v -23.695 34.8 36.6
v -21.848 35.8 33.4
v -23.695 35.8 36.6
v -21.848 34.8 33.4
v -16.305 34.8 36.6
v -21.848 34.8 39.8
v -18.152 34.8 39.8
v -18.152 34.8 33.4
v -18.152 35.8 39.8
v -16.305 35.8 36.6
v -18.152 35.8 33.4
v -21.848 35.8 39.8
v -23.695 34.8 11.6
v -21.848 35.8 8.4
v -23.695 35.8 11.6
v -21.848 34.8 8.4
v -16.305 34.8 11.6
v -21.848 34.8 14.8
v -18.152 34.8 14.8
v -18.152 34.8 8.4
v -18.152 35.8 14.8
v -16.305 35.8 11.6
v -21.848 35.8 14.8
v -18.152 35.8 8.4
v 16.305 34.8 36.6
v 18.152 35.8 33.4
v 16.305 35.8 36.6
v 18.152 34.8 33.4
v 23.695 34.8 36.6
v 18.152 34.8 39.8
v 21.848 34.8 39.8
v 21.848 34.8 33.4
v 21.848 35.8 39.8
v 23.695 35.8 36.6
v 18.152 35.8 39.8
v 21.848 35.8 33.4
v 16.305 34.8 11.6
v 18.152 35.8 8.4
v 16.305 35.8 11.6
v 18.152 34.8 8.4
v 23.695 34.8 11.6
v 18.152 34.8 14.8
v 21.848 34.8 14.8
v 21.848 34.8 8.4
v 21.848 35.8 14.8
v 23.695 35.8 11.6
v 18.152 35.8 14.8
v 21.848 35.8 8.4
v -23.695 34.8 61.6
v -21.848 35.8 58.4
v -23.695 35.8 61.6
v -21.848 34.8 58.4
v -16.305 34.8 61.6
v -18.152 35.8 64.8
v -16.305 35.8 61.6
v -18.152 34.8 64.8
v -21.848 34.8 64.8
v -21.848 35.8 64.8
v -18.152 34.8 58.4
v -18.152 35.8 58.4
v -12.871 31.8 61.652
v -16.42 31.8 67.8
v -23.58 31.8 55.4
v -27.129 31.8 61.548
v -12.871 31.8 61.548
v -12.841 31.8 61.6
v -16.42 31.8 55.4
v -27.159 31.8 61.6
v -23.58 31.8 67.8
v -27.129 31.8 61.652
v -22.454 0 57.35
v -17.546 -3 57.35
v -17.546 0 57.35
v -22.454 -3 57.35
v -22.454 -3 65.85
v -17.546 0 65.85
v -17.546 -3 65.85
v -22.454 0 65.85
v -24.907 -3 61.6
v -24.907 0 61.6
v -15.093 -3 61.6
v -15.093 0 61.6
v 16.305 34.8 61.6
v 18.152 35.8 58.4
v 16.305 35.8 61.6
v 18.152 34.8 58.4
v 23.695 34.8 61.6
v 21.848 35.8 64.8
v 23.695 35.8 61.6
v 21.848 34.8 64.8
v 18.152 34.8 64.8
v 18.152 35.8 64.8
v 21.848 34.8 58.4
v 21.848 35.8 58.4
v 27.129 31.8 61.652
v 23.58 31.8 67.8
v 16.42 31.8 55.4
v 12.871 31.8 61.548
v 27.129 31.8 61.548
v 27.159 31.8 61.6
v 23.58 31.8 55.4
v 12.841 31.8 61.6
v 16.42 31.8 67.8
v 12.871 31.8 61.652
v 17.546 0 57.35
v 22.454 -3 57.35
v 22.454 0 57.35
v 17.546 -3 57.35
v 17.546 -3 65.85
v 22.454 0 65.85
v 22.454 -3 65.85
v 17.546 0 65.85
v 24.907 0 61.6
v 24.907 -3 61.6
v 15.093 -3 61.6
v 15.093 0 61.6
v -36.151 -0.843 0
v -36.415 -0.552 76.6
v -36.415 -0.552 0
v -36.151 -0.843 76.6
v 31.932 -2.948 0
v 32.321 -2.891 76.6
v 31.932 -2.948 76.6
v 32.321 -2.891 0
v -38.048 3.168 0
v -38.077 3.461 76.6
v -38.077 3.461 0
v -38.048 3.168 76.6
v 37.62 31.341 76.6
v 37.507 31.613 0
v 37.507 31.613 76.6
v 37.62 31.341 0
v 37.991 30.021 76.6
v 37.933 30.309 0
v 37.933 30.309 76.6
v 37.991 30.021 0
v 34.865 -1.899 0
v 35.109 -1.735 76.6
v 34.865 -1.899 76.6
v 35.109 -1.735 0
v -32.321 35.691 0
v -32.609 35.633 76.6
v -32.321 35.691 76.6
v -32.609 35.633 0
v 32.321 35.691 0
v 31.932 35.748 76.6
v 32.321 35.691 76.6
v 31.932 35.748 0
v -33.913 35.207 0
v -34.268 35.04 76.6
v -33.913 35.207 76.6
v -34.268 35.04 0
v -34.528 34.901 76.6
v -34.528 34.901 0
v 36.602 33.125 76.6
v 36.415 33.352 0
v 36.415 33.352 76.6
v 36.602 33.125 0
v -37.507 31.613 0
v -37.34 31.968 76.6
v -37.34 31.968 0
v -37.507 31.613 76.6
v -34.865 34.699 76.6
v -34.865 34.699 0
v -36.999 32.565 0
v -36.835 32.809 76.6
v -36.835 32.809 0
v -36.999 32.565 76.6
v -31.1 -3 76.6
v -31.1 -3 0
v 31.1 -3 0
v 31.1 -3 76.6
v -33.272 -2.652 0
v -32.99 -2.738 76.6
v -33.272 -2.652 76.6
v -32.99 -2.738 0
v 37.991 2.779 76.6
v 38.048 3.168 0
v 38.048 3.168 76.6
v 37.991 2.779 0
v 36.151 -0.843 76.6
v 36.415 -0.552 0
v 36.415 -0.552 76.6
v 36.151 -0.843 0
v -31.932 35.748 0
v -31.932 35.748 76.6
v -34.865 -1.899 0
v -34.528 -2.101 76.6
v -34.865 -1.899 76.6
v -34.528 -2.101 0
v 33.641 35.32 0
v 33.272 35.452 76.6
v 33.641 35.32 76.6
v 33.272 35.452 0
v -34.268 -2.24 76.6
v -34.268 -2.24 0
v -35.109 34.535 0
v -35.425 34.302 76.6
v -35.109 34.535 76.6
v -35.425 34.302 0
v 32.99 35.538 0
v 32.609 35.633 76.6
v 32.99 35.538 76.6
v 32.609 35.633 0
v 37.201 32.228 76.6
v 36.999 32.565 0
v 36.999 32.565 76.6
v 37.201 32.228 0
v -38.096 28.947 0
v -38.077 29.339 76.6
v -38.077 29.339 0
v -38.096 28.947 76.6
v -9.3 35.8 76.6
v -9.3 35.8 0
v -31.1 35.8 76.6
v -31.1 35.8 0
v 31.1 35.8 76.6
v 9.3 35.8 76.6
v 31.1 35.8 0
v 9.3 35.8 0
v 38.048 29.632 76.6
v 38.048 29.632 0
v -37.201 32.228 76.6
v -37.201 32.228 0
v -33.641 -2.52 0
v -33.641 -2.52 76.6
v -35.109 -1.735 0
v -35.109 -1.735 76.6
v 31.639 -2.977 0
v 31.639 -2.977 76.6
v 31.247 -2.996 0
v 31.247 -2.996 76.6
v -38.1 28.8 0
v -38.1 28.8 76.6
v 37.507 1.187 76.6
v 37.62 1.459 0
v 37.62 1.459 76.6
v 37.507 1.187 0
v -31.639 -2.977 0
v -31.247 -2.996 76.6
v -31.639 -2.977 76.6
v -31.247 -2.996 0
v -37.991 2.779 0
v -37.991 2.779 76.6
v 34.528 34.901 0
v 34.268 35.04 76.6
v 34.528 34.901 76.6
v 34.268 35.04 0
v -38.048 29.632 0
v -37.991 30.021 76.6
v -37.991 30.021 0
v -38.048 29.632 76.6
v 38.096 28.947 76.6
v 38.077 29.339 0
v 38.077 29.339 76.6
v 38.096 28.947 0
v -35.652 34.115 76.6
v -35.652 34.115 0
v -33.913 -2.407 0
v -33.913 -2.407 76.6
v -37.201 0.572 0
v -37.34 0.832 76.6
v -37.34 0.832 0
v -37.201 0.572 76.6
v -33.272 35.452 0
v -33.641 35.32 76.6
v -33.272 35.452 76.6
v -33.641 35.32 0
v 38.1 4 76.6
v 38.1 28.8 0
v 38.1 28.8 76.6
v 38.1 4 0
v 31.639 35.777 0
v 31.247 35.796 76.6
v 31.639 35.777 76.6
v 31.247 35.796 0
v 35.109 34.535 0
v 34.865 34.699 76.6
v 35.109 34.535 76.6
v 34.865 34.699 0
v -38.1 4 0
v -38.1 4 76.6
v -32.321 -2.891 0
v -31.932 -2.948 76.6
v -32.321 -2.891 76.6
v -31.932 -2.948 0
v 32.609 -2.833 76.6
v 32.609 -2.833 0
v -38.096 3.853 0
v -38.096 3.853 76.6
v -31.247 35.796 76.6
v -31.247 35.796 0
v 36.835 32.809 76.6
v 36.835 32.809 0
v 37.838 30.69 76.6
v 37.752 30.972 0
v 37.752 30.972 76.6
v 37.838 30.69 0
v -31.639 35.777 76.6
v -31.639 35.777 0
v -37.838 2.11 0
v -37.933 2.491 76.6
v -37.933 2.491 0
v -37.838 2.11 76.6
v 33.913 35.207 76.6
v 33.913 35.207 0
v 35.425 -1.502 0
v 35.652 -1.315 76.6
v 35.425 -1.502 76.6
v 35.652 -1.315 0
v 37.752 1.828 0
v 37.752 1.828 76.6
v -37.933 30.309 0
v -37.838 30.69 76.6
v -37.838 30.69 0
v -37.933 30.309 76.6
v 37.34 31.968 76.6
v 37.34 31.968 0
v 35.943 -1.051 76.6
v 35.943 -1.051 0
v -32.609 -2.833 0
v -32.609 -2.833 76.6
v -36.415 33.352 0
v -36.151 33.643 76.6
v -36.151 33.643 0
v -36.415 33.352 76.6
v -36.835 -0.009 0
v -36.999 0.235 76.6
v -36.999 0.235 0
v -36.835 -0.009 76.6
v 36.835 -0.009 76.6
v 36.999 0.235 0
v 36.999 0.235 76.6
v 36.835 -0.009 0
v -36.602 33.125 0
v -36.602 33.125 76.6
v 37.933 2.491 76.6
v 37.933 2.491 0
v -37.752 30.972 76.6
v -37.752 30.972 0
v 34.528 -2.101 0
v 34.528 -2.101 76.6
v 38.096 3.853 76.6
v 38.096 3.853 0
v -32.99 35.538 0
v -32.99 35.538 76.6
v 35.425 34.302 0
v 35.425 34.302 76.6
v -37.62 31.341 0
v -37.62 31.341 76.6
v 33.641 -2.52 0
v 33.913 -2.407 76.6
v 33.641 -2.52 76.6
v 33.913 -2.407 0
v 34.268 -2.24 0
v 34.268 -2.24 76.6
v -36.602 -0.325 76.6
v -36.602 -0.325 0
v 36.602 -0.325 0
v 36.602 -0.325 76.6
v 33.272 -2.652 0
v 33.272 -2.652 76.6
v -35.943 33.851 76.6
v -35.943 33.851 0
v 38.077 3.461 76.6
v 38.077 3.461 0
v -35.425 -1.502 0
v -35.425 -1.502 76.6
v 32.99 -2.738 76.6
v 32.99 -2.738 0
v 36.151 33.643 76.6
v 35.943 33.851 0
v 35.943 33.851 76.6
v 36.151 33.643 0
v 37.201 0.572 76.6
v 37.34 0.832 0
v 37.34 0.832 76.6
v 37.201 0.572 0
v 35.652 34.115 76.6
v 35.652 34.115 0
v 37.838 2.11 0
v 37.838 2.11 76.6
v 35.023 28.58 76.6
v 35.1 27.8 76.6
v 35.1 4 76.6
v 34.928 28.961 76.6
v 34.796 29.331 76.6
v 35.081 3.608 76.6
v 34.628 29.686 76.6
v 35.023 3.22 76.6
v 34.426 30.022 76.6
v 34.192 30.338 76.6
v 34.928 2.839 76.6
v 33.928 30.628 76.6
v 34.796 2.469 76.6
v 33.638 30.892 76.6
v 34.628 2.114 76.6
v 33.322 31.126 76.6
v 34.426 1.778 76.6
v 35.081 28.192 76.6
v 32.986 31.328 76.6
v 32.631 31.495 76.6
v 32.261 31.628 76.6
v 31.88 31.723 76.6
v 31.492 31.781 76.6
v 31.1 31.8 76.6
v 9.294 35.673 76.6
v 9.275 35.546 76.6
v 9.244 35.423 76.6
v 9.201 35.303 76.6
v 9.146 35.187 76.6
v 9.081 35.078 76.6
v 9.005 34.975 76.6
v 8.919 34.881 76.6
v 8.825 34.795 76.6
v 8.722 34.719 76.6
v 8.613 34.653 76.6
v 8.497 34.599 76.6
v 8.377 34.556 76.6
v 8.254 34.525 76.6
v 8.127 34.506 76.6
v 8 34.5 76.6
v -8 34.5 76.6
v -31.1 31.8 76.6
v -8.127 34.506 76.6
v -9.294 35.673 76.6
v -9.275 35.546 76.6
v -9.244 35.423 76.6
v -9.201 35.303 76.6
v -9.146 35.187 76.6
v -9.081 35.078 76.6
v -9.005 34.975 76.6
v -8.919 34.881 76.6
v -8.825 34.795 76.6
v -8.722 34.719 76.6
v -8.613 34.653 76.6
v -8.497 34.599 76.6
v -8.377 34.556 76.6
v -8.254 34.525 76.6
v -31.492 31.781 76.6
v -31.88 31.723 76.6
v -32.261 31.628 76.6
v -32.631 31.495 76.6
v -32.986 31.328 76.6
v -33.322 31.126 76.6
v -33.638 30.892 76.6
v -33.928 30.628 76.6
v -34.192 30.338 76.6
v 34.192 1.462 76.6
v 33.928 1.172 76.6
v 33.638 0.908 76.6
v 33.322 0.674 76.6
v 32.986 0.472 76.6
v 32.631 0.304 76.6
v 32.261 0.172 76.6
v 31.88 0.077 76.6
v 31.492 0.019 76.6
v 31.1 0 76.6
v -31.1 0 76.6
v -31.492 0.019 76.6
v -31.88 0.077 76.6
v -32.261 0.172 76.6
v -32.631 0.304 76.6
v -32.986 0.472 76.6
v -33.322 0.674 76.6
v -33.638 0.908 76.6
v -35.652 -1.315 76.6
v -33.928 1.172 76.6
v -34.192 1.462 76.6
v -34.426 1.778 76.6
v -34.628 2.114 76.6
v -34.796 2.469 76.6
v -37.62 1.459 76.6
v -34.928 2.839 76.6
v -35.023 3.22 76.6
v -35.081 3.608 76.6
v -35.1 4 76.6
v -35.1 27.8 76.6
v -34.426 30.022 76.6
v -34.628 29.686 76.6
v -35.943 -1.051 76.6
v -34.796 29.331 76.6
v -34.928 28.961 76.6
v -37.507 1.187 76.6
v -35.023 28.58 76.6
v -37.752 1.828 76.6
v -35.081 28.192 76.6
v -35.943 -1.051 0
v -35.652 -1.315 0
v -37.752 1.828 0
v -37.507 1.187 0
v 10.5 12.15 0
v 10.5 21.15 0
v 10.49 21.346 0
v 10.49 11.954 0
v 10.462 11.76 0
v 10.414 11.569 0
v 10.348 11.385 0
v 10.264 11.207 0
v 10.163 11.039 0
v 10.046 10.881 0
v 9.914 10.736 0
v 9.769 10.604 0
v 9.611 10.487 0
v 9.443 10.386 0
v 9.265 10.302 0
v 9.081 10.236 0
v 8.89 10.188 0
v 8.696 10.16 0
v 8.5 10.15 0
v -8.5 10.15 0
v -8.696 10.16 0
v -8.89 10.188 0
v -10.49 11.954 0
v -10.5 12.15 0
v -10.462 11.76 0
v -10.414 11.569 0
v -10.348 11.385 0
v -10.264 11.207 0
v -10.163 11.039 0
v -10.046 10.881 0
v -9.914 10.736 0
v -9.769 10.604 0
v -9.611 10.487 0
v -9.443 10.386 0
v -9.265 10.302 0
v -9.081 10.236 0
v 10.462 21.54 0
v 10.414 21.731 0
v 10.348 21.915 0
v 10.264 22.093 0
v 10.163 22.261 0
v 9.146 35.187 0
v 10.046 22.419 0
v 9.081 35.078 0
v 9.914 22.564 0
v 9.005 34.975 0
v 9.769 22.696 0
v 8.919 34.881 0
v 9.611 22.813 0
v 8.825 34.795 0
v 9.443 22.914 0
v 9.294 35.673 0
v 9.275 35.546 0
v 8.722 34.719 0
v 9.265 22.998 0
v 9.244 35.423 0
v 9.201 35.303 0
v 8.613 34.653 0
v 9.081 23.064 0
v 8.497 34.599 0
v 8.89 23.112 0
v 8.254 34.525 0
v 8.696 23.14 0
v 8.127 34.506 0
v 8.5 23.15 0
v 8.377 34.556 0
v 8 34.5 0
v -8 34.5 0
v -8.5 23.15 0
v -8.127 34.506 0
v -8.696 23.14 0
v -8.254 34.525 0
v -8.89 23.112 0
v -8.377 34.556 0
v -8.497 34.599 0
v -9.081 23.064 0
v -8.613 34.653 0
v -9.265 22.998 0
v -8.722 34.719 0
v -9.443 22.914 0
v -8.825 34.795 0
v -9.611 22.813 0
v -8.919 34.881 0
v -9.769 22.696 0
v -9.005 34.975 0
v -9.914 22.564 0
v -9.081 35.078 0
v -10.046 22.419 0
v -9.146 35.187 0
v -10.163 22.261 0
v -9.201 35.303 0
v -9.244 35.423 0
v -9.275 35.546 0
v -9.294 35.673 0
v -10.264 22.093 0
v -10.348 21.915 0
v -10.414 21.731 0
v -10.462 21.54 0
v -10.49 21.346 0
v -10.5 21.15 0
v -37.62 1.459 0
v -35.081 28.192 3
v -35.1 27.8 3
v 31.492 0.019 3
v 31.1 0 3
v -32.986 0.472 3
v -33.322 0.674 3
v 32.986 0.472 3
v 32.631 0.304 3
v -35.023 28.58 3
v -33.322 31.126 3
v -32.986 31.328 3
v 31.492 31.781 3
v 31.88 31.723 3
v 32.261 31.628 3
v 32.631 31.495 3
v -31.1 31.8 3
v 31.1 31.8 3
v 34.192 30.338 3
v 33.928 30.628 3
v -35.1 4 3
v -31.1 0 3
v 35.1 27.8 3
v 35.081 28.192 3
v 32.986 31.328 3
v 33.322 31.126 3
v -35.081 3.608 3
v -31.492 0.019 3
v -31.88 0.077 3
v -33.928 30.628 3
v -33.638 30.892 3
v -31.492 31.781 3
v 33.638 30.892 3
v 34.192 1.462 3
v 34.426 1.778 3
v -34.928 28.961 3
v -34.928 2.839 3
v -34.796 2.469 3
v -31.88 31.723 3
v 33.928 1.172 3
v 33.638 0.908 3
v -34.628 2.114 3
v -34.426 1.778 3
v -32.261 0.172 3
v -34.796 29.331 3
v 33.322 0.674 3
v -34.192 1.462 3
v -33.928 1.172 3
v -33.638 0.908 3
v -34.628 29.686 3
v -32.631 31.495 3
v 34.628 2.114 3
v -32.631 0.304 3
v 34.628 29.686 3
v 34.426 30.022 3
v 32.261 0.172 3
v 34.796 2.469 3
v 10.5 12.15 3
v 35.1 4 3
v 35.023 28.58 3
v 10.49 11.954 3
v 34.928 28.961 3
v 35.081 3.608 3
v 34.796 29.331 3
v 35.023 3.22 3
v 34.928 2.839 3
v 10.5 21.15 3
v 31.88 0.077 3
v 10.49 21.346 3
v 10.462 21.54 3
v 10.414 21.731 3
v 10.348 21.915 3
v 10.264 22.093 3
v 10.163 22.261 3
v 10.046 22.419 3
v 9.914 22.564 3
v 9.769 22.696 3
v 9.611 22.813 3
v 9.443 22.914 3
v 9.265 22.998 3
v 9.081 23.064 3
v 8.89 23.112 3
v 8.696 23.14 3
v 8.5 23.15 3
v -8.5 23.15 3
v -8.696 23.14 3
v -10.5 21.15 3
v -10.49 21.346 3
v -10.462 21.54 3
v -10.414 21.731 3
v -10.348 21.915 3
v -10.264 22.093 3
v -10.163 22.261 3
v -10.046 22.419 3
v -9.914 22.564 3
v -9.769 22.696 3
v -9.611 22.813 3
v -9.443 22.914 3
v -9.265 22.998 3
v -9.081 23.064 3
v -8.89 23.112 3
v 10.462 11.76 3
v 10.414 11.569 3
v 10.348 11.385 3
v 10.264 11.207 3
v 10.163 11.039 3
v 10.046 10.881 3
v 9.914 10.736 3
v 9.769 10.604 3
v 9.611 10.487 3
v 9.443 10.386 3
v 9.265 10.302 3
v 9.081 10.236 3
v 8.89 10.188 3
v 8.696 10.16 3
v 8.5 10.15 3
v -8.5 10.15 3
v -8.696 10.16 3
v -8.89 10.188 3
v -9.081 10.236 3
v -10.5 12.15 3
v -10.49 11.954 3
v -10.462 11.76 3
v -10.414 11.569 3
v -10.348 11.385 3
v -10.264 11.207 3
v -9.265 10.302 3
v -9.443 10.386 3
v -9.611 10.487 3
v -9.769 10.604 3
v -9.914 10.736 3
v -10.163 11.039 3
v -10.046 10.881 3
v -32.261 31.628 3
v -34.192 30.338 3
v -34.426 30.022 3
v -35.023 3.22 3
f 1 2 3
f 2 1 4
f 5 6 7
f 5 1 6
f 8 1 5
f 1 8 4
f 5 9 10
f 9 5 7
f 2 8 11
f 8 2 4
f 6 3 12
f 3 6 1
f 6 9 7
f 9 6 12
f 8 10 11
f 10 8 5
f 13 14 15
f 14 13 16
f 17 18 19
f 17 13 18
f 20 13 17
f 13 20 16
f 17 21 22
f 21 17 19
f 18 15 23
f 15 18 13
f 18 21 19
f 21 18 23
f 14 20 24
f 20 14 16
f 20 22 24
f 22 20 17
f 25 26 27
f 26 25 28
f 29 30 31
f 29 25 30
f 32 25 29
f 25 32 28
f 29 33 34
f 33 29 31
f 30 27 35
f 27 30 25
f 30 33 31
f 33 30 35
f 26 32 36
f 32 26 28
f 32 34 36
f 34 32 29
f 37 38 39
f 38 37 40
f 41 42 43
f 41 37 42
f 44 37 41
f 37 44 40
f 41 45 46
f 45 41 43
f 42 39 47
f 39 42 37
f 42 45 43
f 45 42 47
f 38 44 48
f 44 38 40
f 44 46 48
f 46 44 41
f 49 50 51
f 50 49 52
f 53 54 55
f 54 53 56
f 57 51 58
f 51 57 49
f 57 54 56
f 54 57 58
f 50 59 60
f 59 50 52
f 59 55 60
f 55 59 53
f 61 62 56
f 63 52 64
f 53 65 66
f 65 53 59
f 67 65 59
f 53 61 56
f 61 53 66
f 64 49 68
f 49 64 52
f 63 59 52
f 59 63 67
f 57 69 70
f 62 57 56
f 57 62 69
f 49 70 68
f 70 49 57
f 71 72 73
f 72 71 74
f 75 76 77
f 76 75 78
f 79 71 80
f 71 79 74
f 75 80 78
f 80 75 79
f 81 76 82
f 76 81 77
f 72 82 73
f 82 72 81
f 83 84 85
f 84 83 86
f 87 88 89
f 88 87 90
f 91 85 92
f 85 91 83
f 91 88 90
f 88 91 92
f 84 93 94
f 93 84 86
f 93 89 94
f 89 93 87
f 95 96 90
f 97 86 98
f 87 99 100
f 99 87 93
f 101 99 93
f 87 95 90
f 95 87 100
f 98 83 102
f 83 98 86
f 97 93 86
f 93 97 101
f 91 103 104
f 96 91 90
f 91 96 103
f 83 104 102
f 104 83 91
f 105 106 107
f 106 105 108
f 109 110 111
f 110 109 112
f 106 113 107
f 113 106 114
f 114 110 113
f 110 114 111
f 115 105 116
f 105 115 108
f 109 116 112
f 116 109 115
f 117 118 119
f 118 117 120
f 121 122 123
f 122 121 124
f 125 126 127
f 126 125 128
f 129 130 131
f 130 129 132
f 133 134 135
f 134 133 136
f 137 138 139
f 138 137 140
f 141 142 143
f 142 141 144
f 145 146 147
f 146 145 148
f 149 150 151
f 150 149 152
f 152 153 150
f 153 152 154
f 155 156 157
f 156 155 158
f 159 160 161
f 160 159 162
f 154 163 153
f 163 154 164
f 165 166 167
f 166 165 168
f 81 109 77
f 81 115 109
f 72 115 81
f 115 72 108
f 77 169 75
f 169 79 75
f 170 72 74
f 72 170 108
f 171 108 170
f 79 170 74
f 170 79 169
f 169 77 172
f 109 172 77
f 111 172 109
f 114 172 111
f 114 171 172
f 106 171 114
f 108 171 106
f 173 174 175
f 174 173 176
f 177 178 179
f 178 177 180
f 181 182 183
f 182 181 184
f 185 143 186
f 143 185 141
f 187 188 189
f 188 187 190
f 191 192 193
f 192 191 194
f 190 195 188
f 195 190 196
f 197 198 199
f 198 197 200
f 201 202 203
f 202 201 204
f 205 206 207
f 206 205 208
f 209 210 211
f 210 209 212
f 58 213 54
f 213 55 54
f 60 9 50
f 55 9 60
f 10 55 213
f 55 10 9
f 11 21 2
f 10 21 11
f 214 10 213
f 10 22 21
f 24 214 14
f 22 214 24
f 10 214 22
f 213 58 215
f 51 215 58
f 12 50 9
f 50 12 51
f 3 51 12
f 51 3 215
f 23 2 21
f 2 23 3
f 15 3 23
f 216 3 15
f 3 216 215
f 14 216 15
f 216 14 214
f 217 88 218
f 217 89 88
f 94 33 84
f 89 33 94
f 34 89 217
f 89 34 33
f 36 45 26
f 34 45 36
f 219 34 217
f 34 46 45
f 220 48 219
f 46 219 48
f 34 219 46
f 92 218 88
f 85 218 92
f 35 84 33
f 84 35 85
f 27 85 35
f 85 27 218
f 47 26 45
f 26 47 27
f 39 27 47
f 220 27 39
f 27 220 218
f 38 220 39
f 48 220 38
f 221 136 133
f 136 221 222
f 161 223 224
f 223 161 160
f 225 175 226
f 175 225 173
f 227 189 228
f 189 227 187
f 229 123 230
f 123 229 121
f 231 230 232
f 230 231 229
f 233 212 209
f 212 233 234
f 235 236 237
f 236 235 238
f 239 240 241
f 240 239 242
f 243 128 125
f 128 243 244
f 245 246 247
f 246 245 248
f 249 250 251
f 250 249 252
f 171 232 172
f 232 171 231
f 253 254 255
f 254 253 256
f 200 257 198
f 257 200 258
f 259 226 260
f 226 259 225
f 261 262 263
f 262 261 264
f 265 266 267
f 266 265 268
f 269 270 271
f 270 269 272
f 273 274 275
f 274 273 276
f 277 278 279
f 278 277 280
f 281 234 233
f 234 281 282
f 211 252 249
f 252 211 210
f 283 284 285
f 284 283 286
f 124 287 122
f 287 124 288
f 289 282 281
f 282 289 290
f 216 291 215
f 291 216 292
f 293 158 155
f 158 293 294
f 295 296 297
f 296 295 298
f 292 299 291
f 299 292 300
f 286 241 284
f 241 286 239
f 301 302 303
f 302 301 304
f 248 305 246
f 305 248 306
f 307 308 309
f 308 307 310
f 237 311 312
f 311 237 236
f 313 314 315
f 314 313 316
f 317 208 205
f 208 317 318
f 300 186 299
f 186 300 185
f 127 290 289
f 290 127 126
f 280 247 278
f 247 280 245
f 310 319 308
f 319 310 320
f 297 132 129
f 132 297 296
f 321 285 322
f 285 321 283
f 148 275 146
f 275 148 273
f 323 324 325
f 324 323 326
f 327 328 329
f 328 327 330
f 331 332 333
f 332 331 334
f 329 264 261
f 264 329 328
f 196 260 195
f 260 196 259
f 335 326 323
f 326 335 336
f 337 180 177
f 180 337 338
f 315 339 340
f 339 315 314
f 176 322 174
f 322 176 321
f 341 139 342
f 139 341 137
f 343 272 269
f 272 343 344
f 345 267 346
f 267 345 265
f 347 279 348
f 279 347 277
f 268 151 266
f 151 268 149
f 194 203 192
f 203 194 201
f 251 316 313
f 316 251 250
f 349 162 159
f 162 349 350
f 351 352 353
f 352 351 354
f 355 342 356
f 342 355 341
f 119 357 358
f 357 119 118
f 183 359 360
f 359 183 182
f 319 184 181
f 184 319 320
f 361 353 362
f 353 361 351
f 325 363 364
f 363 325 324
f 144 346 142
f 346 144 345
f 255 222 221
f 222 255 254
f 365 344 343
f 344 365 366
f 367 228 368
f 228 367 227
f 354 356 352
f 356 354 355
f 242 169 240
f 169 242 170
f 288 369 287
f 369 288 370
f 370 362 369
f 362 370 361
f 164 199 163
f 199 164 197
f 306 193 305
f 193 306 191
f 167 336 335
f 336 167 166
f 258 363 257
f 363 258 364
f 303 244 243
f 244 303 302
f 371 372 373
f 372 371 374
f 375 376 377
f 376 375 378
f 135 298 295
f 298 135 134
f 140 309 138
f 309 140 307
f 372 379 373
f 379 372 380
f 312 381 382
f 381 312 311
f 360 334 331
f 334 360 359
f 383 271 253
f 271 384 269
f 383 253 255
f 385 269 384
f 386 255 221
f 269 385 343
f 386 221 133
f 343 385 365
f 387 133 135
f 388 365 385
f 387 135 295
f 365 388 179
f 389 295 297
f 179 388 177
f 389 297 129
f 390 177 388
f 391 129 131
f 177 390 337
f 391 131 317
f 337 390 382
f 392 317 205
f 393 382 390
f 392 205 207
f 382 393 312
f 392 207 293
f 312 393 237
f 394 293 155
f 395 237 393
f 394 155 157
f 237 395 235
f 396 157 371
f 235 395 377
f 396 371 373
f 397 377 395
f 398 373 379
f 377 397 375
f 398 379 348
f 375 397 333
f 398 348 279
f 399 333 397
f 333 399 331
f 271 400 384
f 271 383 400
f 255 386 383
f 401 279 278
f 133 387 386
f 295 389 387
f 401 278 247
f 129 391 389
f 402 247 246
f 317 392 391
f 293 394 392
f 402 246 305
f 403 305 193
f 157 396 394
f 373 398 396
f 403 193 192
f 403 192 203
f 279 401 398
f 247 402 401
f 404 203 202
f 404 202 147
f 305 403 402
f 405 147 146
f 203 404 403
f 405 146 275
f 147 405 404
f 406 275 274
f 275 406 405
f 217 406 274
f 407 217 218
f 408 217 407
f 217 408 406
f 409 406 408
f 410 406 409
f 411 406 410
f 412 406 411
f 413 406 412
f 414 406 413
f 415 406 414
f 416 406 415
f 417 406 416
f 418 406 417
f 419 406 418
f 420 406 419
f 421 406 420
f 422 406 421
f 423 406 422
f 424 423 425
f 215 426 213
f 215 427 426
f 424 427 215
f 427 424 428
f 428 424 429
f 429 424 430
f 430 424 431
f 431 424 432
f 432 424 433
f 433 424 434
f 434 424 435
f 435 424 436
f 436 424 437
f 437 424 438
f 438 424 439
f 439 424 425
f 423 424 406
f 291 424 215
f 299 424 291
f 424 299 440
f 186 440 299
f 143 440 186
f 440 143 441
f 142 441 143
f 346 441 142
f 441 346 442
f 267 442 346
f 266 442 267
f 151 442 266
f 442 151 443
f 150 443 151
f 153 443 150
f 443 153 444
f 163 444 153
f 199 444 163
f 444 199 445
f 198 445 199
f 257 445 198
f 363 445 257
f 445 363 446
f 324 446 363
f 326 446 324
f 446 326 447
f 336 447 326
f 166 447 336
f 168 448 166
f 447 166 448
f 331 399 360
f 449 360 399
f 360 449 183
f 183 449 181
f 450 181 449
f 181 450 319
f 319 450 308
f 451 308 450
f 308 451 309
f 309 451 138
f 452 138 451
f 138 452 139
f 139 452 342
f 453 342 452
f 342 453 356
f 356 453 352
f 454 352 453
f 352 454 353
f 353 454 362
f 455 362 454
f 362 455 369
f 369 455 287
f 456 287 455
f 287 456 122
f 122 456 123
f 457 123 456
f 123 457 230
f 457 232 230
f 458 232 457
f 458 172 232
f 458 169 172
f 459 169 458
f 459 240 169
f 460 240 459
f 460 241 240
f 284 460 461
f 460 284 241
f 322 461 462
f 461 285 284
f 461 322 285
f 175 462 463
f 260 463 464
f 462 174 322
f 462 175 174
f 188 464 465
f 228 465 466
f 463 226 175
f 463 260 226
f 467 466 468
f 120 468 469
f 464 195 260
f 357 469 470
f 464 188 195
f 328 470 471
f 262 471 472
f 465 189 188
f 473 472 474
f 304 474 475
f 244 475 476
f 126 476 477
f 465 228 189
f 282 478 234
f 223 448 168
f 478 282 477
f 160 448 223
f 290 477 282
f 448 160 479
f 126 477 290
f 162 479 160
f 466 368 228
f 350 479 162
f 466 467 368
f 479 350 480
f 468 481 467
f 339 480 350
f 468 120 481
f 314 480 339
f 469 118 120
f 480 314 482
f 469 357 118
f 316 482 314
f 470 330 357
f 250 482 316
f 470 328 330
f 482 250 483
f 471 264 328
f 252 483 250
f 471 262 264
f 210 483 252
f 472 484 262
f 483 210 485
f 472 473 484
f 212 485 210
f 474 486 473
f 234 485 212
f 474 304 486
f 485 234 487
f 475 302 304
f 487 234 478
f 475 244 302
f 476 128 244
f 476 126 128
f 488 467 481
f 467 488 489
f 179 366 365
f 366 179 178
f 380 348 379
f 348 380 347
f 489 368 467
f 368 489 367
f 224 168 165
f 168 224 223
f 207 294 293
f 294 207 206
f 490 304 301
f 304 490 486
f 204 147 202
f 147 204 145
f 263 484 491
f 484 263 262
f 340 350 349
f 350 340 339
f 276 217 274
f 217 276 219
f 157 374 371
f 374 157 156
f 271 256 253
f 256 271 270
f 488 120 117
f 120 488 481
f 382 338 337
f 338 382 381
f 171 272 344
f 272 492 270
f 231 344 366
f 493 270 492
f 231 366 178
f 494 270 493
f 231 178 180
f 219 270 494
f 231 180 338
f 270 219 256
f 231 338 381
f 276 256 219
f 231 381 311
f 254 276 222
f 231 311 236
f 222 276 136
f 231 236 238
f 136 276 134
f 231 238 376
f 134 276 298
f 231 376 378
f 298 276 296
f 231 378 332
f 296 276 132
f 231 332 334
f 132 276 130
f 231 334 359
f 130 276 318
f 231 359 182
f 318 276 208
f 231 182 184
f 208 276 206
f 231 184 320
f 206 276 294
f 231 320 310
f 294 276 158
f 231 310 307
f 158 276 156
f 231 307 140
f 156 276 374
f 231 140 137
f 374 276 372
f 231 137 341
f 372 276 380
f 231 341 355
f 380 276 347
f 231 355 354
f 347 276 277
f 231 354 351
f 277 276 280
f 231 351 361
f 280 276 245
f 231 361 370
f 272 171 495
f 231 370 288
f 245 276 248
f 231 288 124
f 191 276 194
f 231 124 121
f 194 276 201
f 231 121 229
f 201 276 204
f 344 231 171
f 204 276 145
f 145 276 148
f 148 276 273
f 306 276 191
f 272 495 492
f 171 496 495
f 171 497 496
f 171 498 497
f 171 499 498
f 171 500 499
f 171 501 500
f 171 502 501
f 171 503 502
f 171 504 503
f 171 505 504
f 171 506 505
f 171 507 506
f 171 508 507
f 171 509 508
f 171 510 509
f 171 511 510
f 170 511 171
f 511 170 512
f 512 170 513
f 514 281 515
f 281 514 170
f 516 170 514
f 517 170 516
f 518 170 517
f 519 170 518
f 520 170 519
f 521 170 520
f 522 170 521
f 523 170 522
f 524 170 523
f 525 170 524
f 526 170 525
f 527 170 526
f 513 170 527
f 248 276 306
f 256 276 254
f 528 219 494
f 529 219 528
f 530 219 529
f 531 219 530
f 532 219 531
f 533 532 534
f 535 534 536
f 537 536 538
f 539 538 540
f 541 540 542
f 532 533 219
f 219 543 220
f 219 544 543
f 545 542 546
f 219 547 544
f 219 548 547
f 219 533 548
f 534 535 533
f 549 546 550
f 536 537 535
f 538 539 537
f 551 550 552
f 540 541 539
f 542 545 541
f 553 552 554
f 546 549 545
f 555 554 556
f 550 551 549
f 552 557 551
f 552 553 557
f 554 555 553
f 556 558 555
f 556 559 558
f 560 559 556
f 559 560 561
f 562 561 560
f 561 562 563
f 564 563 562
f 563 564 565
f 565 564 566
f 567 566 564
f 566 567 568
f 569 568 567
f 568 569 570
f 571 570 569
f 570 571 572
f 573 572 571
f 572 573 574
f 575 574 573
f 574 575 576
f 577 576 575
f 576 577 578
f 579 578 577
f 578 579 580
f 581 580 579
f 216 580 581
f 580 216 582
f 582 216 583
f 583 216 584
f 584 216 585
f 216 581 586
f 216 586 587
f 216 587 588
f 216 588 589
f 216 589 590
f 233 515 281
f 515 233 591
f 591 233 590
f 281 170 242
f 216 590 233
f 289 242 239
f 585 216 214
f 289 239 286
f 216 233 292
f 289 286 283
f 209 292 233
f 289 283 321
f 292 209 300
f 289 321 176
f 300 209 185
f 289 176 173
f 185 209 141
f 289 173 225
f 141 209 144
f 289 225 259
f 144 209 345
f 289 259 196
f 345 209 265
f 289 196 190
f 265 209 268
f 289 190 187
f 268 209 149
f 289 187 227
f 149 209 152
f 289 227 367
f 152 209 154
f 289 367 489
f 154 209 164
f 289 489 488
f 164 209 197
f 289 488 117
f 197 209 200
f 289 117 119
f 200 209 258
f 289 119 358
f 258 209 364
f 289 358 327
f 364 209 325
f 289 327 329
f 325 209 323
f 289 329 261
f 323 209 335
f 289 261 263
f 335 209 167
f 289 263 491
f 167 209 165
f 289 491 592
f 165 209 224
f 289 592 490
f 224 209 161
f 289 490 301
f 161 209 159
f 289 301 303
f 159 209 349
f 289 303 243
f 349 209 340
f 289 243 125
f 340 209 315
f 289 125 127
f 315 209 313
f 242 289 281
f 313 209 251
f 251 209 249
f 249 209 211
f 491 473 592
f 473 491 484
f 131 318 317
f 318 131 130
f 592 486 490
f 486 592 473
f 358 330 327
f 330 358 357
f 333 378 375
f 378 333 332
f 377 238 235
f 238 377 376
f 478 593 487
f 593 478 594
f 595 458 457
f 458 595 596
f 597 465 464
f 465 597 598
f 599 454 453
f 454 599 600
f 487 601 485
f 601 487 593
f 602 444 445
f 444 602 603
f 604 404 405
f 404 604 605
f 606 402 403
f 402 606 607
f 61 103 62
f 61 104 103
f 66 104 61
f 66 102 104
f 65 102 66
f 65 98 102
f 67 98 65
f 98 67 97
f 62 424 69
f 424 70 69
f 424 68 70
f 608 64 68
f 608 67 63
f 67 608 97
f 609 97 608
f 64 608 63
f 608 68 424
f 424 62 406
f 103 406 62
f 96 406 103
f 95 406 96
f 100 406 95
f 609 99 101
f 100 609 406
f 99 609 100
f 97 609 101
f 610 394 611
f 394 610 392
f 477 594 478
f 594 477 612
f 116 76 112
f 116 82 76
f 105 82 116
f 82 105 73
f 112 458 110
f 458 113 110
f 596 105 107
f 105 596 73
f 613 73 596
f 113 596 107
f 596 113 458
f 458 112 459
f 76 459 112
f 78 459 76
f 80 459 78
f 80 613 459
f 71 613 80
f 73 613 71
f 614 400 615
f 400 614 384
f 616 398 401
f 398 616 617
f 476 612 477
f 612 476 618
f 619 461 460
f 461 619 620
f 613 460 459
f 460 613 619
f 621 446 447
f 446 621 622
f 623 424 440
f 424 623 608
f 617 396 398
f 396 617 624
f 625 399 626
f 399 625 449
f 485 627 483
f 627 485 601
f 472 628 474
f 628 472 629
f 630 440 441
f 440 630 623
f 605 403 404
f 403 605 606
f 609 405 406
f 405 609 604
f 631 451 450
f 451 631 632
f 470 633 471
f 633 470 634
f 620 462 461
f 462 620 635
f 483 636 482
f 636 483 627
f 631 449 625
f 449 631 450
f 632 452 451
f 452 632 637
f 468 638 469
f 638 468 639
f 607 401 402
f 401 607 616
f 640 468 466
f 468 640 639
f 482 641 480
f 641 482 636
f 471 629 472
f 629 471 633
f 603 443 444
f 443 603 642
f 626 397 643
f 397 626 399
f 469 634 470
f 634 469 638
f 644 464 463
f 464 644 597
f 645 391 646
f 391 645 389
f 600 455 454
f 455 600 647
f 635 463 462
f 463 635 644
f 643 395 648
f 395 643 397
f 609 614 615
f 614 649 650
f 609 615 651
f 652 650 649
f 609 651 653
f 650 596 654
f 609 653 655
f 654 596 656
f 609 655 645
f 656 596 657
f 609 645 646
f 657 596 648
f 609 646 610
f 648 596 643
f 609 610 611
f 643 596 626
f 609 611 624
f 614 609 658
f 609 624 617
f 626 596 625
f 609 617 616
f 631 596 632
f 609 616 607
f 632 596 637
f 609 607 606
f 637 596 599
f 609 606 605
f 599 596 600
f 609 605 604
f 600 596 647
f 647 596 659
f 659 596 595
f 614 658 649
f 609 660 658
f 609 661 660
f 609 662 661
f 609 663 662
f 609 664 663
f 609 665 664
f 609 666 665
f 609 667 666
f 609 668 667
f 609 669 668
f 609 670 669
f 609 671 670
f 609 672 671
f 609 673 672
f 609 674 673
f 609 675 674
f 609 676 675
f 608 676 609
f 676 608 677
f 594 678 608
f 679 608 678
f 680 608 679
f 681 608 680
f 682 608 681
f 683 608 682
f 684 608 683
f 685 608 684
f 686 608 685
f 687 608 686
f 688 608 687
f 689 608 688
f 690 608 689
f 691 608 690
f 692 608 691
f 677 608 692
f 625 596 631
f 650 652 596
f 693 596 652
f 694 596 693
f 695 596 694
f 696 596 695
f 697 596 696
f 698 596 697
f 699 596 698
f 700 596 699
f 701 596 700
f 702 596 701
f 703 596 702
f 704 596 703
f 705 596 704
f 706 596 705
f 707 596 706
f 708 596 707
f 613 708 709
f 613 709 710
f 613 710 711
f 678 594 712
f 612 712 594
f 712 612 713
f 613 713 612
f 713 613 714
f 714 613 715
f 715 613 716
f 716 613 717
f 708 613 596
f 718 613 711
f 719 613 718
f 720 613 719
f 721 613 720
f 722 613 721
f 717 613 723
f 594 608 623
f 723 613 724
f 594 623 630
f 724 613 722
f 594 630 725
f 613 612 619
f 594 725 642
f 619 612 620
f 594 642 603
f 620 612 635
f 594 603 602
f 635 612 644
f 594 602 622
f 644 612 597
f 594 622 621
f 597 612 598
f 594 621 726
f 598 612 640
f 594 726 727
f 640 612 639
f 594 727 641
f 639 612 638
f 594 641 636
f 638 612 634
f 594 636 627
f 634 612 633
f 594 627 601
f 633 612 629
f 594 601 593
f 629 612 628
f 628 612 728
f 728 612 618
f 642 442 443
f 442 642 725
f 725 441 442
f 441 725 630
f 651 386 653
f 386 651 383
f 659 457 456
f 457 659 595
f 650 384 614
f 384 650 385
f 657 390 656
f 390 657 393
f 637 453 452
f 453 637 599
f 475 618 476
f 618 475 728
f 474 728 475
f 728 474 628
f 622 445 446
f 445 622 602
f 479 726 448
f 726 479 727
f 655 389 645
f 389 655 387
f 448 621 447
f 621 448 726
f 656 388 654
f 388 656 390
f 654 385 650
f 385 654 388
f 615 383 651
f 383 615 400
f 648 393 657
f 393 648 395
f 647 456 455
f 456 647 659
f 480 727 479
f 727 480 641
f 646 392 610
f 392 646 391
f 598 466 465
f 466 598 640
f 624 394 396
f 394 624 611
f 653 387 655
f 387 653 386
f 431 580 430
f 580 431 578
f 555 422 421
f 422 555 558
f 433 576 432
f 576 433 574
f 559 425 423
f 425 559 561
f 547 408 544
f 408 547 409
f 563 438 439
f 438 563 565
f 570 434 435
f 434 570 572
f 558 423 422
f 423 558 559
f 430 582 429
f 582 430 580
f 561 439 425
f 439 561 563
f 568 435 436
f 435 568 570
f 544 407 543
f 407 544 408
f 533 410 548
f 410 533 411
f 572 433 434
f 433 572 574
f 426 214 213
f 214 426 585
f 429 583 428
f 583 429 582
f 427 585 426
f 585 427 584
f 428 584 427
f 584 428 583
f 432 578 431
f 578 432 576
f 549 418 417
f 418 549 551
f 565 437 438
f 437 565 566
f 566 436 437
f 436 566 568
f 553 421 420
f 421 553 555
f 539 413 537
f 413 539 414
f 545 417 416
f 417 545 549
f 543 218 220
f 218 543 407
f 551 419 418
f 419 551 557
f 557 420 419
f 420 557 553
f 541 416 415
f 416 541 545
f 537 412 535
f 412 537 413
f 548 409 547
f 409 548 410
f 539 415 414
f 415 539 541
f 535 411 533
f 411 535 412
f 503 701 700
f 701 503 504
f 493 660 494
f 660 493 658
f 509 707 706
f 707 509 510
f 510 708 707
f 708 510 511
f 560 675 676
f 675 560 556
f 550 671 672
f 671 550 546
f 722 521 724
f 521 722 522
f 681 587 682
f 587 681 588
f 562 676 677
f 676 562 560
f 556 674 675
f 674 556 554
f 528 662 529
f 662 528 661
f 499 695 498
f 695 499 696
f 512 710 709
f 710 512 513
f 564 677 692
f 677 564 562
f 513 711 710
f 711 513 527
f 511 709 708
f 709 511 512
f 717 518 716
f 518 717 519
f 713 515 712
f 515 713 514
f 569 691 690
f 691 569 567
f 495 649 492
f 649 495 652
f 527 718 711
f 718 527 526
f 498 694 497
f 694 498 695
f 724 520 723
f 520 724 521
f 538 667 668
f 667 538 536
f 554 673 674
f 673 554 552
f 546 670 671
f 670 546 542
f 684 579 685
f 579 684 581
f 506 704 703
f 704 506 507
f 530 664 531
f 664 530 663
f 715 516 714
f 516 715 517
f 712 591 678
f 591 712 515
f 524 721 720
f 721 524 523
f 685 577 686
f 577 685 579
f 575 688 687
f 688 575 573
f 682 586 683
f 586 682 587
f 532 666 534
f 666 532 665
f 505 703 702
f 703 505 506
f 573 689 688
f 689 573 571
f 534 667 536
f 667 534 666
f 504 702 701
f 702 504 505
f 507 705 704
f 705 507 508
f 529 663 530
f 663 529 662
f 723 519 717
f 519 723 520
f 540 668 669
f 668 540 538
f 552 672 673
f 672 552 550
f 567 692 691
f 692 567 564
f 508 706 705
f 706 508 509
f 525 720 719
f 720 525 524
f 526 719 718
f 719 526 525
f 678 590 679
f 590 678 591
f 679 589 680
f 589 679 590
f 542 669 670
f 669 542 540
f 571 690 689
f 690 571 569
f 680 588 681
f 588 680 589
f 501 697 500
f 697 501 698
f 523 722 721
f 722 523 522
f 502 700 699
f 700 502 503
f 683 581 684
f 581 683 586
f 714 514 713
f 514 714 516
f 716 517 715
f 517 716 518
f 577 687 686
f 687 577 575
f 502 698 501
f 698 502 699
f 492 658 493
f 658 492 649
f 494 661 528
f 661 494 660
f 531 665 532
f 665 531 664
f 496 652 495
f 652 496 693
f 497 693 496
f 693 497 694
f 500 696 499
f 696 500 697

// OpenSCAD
// file: ../../modules/bolts.scad
module nut_trap(d, h, center = true) {
  linear_extrude(height = h, center = center)
  circle(d = d / cos(30), $fn = 6);
}

module bolt_hole(d, h, center = true) {
  linear_extrude(height = h, center = center)
  circle(d = d, $fn = 64);
}

// Hex holes for self-tapping (nominal - 0.2mm)
module hex_hole(flat_d, h) {
  linear_extrude(height = h, center = true)
  circle(d = flat_d / cos(30), $fn = 6);
}

module m3_bolt_hexhole(h) {
  rotate([0, 0, 90]) hex_hole(flat_d = 2.8, h = h);
}

module m4_bolt_hexhole(h) {
  rotate([0, 0, 90]) hex_hole(flat_d = 3.8, h = h);
}

module m6_bolt_hexhole(h) {
  rotate([0, 0, 90]) hex_hole(flat_d = 5.8, h = h);
}

module m8_bolt_hexhole(h) {
  rotate([0, 0, 90]) hex_hole(flat_d = 7.8, h = h);
}

// M3
module m3_bolt_hole(h, center = false) { bolt_hole(d = 3.4, h = h, center = center); }
module m3_nut_trap(h, center = false) { nut_trap(d = 5.7, h = h, center = center); }

// M4
module m4_bolt_hole(h, center = false) { bolt_hole(d = 4.4, h = h, center = center); }
module m4_nut_trap(h, center = false) { nut_trap(d = 7.5, h = h, center = center); }

// M6
module m6_bolt_hole(h, center = false) { bolt_hole(d = 6.2, h = h, center = center); }
module m6_nut_trap(h, center = false) { nut_trap(d = 10.2, h = h, center = center); }

// M8
module m8_bolt_hole(h, center = false) { bolt_hole(d = 8.4, h = h, center = center); }
module m8_nut_trap(h, center = false) { nut_trap(d = 13.3, h = h, center = center); }
// main file
use <../../modules/bolts.scad>

// X=左右中心、Y=内側前端(工具側)、+Y=クランプ側、Z=底面。
charger_w = 69.2;
charger_d = 30.8;
charger_h = 73.6;
clearance = 1; // 幅・奥行きそれぞれの総クリアランス
inner_r = 4;
wall = 3;
mount_wall = 4;
floor_t = 3;

mount_pitch = 40;
mount_row_pitch = 25;
mount_from_top = 15; // 未実測の仮値。穴中心から上端まで
screw_flat = 6.4;
head_flat = 12.4; // 皿頭未実測の仮値 (対辺)
head_depth = 3;
driver_flat = 8.5;
tip_depth = 1;
rib_w = 16;
rib_depth = 1.3;
rib_r = 1.3;

jack_w = 17;
jack_d = 9;
jack_front = 11;
jack_back = 9.5;
jack_margin = 2; // 四方へそれぞれ追加
jack_r = 2;
arc_fn = 64;
eps = 0.05;

inner_w = charger_w + clearance;
inner_d = charger_d + clearance;
height = charger_h + floor_t;
mount_z = height - mount_from_top;
mount_y = inner_d + mount_wall;
// 両側の測定から推定した中心を平均し、前側のクリアランス半分を加える。
jack_y = (jack_front + jack_d / 2 + charger_d - jack_back - jack_d / 2) / 2 + clearance / 2;
head_slope = (head_flat - screw_flat) / head_depth;

module cavity_2d() {
  translate([-inner_w / 2 + inner_r, inner_r])
    offset(r = inner_r, $fn = arc_fn)
      square([inner_w - 2 * inner_r, inner_d - 2 * inner_r]);
}

module outline_2d() {
  offset(r = wall, $fn = arc_fn) hull() {
    cavity_2d();
    translate([0, mount_wall - wall]) cavity_2d();
  }
}

// 軸は+Y。開始面の対辺aから、長さhで対辺bへ絞る。
module hex_taper_y(a, b, h) {
  rotate([-90, 0, 0]) linear_extrude(height = h, scale = b / a)
    circle(d = a / cos(30), $fn = 6);
}

module lx_charger_holder() {
  assert(mount_wall >= wall && head_depth > 0 && head_depth < mount_wall);
  assert(head_flat > screw_flat && driver_flat > 6.35 / cos(30));
  assert(mount_from_top > max(head_flat, driver_flat) / 2);
  assert(mount_z - max(head_flat, driver_flat) / 2 > floor_t);
  difference() {
    linear_extrude(height = height) outline_2d();
    translate([0, 0, floor_t]) linear_extrude(height = charger_h + eps) cavity_2d();

    // 中央16×1.3を全高で逃がす。Rの肉が逃げを狭めないよう左右へ広げる。
    // 入口幅は16+2*1.3=18.6、中央の残肉は4-1.3=2.7。
    translate([-rib_w / 2, mount_y - rib_depth + rib_r, -eps])
      linear_extrude(height = height + 2 * eps)
        offset(r = rib_r, $fn = arc_fn) square([rib_w, rib_depth + eps]);

    // 底穴は21×13の角丸矩形。くびれを作らずプラグの通り道を確保する。
    translate([-jack_w / 2 - jack_margin + jack_r,
               jack_y - jack_d / 2 - jack_margin + jack_r, -eps])
      linear_extrude(height = floor_t + 2 * eps)
        offset(r = jack_r, $fn = arc_fn)
          square([jack_w + 2 * jack_margin - 2 * jack_r,
                  jack_d + 2 * jack_margin - 2 * jack_r]);

    for (x = [-mount_pitch / 2, mount_pitch / 2]) {
      translate([x, inner_d + mount_wall / 2, mount_z])
        rotate([-90, 0, 0]) hex_hole(screw_flat, mount_wall + 2 * eps);
      // 皿座は充電器側の面。クランプ接触面側は通し穴のまま1mm残す。
      translate([x, inner_d - eps, mount_z])
        hex_taper_y(head_flat + eps * head_slope, screw_flat, head_depth + eps);
      translate([x, -wall / 2, mount_z])
        rotate([-90, 0, 0]) hex_hole(driver_flat, wall + 2 * eps);
      // 最上段を固定に使用。残る中・下段はクランプ側から深さ1mmの止まり穴。
      for (row = [1, 2])
        translate([x, mount_y - tip_depth, mount_z - row * mount_row_pitch])
          hex_taper_y(screw_flat, screw_flat, tip_depth + eps);
    }
  }
}

echo(str("CONTRACT lx_holder: inner = ", [inner_w, inner_d, charger_h]));
echo(str("CONTRACT lx_holder: mount = ", [mount_pitch, screw_flat, mount_z]));
echo(str("CONTRACT lx_holder: jack = ", [jack_w + 2 * jack_margin, jack_d + 2 * jack_margin, jack_y]));
lx_charger_holder();
